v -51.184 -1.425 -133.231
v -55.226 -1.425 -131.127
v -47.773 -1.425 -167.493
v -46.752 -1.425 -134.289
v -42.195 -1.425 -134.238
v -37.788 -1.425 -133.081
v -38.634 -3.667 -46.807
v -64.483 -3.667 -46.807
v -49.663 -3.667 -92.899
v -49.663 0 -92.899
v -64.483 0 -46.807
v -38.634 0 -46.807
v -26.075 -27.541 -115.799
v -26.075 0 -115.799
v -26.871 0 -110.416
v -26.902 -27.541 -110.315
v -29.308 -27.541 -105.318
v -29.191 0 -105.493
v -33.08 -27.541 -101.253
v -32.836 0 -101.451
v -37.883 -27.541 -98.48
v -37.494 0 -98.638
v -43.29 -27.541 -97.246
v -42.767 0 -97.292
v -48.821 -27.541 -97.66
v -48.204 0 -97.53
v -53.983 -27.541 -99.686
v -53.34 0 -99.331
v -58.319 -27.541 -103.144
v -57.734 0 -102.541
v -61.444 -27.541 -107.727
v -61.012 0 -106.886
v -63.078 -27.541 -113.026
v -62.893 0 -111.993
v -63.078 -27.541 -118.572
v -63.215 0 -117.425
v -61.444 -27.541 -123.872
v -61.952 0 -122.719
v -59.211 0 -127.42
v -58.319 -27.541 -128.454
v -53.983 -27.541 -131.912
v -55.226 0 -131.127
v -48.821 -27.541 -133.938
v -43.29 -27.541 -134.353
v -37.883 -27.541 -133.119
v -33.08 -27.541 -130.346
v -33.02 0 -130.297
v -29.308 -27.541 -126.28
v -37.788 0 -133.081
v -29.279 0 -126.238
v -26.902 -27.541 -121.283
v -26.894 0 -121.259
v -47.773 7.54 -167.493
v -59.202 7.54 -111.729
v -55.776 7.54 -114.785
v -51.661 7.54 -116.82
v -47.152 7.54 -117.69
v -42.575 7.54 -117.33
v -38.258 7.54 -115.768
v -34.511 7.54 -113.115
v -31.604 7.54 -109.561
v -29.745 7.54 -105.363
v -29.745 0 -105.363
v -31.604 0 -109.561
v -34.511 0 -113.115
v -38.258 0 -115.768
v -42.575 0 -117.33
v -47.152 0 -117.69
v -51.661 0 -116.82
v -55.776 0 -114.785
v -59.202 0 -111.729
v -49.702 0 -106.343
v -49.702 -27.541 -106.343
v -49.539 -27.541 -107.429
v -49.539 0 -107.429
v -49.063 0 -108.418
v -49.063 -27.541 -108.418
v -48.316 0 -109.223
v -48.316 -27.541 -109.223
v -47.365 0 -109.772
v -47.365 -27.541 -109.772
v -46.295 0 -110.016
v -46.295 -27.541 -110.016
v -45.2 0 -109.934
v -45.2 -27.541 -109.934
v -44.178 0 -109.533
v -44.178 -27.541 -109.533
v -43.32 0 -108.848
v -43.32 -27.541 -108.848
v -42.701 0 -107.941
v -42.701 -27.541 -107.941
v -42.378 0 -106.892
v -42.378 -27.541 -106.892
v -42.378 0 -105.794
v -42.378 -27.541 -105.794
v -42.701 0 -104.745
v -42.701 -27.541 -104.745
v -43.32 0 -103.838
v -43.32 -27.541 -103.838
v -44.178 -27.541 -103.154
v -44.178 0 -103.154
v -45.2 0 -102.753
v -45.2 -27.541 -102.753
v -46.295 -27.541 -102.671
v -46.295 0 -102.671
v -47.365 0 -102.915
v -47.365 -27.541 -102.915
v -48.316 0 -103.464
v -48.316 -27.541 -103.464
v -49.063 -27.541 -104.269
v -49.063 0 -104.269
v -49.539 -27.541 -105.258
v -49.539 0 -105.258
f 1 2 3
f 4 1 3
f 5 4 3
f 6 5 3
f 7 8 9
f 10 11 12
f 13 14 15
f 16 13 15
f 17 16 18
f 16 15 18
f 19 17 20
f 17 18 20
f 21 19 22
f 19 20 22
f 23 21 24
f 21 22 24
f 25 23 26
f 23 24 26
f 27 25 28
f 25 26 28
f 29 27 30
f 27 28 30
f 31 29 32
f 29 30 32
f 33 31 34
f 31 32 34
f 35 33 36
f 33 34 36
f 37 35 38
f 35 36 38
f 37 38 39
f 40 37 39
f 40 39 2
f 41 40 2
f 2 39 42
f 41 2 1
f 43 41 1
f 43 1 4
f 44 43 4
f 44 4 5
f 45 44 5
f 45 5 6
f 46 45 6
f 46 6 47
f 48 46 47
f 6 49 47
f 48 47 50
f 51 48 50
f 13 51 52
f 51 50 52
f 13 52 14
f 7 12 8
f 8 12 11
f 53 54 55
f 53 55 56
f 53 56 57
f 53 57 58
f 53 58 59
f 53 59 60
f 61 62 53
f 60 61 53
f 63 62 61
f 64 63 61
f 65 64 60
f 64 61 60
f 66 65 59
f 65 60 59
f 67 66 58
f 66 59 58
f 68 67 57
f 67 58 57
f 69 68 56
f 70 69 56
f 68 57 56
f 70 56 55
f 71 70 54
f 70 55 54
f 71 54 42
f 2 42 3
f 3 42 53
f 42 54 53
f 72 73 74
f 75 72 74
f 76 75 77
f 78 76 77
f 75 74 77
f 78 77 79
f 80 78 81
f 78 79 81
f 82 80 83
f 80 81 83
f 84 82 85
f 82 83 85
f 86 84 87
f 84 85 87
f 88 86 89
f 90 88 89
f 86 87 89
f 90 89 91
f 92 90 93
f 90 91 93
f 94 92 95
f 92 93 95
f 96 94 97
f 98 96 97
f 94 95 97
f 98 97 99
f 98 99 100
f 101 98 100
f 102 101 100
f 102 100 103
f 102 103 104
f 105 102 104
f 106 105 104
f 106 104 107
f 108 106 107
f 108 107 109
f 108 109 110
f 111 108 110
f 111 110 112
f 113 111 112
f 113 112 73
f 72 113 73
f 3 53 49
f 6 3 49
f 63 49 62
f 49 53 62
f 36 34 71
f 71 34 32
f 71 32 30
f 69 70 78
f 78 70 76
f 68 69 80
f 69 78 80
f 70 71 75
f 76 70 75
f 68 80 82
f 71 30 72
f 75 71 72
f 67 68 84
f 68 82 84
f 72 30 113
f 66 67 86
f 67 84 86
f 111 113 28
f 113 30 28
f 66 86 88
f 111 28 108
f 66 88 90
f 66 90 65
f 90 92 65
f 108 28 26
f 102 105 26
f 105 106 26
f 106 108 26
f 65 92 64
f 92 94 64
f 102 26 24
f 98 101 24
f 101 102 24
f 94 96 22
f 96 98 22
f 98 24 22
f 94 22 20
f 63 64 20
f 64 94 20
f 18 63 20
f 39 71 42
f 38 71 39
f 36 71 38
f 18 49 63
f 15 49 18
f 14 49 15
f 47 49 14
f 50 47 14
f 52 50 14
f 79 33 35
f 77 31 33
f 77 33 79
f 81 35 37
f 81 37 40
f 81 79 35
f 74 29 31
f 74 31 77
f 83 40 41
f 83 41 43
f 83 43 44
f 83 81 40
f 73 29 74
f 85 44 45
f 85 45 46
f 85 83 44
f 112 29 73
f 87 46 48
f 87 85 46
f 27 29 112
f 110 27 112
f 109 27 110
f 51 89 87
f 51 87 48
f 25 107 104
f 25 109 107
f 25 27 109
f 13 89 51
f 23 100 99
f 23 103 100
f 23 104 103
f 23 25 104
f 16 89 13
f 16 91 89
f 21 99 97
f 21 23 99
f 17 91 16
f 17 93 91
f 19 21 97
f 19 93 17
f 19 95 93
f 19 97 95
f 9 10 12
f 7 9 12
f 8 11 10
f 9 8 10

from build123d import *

# Parameters (mm, degrees)
F1_DEPTH = 7.5402432121
F2_DEPTH = 1.4253571862
F3_R     = 18.605552665
F4_DEPTH = 27.5406818837
F6_DEPTH = 3.6672297865
F8_D     = 7.366


with BuildPart() as f1:
    # F0 (on Front) → F1 (new body)
    with BuildSketch(Plane.XZ):
        with BuildLine():
            ThreePointArc((-29.7449376156, -105.363153987), (-42.5752824221, -117.3303519227), (-59.202212781, -111.7288555937))
            Line((-59.202212781, -111.7288555937), (-47.7732121944, -167.4931943417))
            Line((-47.7732121944, -167.4931943417), (-29.7449376156, -105.363153987))
        make_face()
    extrude(amount=-F1_DEPTH)

    # F2 (add): a face of the model
    f2_faces = [f1.faces().sort_by_distance(p)[0] for p in [
        (-46.1184940626, 0, -132.847419827),
    ]]
    extrude(f2_faces, amount=F2_DEPTH)

    # F3 (on Front) → F4 (join)
    with BuildSketch(Plane.XZ):
        with Locations((-44.6806028485, -115.7991886139)):
            Circle(F3_R)
    extrude(amount=F4_DEPTH)

    # F8 (through all)
    with Locations(Plane(origin=(0, 0, 0), x_dir=(1, 0, 0), z_dir=(0, 1, 0))):
        with Locations((-46.0194945335, 106.3432246447)):
            Hole(F8_D / 2)


with BuildPart() as f6:
    # F5 (on Front) → F6 (new body)
    with BuildSketch(Plane.XZ):
        Polygon((-64.4827634096, -46.8071959913), (-49.6632680297, -92.8986370564), (-38.6338308454, -46.8071959913), align=None)
    extrude(amount=F6_DEPTH)


solid = Compound([f1.part, f6.part])
